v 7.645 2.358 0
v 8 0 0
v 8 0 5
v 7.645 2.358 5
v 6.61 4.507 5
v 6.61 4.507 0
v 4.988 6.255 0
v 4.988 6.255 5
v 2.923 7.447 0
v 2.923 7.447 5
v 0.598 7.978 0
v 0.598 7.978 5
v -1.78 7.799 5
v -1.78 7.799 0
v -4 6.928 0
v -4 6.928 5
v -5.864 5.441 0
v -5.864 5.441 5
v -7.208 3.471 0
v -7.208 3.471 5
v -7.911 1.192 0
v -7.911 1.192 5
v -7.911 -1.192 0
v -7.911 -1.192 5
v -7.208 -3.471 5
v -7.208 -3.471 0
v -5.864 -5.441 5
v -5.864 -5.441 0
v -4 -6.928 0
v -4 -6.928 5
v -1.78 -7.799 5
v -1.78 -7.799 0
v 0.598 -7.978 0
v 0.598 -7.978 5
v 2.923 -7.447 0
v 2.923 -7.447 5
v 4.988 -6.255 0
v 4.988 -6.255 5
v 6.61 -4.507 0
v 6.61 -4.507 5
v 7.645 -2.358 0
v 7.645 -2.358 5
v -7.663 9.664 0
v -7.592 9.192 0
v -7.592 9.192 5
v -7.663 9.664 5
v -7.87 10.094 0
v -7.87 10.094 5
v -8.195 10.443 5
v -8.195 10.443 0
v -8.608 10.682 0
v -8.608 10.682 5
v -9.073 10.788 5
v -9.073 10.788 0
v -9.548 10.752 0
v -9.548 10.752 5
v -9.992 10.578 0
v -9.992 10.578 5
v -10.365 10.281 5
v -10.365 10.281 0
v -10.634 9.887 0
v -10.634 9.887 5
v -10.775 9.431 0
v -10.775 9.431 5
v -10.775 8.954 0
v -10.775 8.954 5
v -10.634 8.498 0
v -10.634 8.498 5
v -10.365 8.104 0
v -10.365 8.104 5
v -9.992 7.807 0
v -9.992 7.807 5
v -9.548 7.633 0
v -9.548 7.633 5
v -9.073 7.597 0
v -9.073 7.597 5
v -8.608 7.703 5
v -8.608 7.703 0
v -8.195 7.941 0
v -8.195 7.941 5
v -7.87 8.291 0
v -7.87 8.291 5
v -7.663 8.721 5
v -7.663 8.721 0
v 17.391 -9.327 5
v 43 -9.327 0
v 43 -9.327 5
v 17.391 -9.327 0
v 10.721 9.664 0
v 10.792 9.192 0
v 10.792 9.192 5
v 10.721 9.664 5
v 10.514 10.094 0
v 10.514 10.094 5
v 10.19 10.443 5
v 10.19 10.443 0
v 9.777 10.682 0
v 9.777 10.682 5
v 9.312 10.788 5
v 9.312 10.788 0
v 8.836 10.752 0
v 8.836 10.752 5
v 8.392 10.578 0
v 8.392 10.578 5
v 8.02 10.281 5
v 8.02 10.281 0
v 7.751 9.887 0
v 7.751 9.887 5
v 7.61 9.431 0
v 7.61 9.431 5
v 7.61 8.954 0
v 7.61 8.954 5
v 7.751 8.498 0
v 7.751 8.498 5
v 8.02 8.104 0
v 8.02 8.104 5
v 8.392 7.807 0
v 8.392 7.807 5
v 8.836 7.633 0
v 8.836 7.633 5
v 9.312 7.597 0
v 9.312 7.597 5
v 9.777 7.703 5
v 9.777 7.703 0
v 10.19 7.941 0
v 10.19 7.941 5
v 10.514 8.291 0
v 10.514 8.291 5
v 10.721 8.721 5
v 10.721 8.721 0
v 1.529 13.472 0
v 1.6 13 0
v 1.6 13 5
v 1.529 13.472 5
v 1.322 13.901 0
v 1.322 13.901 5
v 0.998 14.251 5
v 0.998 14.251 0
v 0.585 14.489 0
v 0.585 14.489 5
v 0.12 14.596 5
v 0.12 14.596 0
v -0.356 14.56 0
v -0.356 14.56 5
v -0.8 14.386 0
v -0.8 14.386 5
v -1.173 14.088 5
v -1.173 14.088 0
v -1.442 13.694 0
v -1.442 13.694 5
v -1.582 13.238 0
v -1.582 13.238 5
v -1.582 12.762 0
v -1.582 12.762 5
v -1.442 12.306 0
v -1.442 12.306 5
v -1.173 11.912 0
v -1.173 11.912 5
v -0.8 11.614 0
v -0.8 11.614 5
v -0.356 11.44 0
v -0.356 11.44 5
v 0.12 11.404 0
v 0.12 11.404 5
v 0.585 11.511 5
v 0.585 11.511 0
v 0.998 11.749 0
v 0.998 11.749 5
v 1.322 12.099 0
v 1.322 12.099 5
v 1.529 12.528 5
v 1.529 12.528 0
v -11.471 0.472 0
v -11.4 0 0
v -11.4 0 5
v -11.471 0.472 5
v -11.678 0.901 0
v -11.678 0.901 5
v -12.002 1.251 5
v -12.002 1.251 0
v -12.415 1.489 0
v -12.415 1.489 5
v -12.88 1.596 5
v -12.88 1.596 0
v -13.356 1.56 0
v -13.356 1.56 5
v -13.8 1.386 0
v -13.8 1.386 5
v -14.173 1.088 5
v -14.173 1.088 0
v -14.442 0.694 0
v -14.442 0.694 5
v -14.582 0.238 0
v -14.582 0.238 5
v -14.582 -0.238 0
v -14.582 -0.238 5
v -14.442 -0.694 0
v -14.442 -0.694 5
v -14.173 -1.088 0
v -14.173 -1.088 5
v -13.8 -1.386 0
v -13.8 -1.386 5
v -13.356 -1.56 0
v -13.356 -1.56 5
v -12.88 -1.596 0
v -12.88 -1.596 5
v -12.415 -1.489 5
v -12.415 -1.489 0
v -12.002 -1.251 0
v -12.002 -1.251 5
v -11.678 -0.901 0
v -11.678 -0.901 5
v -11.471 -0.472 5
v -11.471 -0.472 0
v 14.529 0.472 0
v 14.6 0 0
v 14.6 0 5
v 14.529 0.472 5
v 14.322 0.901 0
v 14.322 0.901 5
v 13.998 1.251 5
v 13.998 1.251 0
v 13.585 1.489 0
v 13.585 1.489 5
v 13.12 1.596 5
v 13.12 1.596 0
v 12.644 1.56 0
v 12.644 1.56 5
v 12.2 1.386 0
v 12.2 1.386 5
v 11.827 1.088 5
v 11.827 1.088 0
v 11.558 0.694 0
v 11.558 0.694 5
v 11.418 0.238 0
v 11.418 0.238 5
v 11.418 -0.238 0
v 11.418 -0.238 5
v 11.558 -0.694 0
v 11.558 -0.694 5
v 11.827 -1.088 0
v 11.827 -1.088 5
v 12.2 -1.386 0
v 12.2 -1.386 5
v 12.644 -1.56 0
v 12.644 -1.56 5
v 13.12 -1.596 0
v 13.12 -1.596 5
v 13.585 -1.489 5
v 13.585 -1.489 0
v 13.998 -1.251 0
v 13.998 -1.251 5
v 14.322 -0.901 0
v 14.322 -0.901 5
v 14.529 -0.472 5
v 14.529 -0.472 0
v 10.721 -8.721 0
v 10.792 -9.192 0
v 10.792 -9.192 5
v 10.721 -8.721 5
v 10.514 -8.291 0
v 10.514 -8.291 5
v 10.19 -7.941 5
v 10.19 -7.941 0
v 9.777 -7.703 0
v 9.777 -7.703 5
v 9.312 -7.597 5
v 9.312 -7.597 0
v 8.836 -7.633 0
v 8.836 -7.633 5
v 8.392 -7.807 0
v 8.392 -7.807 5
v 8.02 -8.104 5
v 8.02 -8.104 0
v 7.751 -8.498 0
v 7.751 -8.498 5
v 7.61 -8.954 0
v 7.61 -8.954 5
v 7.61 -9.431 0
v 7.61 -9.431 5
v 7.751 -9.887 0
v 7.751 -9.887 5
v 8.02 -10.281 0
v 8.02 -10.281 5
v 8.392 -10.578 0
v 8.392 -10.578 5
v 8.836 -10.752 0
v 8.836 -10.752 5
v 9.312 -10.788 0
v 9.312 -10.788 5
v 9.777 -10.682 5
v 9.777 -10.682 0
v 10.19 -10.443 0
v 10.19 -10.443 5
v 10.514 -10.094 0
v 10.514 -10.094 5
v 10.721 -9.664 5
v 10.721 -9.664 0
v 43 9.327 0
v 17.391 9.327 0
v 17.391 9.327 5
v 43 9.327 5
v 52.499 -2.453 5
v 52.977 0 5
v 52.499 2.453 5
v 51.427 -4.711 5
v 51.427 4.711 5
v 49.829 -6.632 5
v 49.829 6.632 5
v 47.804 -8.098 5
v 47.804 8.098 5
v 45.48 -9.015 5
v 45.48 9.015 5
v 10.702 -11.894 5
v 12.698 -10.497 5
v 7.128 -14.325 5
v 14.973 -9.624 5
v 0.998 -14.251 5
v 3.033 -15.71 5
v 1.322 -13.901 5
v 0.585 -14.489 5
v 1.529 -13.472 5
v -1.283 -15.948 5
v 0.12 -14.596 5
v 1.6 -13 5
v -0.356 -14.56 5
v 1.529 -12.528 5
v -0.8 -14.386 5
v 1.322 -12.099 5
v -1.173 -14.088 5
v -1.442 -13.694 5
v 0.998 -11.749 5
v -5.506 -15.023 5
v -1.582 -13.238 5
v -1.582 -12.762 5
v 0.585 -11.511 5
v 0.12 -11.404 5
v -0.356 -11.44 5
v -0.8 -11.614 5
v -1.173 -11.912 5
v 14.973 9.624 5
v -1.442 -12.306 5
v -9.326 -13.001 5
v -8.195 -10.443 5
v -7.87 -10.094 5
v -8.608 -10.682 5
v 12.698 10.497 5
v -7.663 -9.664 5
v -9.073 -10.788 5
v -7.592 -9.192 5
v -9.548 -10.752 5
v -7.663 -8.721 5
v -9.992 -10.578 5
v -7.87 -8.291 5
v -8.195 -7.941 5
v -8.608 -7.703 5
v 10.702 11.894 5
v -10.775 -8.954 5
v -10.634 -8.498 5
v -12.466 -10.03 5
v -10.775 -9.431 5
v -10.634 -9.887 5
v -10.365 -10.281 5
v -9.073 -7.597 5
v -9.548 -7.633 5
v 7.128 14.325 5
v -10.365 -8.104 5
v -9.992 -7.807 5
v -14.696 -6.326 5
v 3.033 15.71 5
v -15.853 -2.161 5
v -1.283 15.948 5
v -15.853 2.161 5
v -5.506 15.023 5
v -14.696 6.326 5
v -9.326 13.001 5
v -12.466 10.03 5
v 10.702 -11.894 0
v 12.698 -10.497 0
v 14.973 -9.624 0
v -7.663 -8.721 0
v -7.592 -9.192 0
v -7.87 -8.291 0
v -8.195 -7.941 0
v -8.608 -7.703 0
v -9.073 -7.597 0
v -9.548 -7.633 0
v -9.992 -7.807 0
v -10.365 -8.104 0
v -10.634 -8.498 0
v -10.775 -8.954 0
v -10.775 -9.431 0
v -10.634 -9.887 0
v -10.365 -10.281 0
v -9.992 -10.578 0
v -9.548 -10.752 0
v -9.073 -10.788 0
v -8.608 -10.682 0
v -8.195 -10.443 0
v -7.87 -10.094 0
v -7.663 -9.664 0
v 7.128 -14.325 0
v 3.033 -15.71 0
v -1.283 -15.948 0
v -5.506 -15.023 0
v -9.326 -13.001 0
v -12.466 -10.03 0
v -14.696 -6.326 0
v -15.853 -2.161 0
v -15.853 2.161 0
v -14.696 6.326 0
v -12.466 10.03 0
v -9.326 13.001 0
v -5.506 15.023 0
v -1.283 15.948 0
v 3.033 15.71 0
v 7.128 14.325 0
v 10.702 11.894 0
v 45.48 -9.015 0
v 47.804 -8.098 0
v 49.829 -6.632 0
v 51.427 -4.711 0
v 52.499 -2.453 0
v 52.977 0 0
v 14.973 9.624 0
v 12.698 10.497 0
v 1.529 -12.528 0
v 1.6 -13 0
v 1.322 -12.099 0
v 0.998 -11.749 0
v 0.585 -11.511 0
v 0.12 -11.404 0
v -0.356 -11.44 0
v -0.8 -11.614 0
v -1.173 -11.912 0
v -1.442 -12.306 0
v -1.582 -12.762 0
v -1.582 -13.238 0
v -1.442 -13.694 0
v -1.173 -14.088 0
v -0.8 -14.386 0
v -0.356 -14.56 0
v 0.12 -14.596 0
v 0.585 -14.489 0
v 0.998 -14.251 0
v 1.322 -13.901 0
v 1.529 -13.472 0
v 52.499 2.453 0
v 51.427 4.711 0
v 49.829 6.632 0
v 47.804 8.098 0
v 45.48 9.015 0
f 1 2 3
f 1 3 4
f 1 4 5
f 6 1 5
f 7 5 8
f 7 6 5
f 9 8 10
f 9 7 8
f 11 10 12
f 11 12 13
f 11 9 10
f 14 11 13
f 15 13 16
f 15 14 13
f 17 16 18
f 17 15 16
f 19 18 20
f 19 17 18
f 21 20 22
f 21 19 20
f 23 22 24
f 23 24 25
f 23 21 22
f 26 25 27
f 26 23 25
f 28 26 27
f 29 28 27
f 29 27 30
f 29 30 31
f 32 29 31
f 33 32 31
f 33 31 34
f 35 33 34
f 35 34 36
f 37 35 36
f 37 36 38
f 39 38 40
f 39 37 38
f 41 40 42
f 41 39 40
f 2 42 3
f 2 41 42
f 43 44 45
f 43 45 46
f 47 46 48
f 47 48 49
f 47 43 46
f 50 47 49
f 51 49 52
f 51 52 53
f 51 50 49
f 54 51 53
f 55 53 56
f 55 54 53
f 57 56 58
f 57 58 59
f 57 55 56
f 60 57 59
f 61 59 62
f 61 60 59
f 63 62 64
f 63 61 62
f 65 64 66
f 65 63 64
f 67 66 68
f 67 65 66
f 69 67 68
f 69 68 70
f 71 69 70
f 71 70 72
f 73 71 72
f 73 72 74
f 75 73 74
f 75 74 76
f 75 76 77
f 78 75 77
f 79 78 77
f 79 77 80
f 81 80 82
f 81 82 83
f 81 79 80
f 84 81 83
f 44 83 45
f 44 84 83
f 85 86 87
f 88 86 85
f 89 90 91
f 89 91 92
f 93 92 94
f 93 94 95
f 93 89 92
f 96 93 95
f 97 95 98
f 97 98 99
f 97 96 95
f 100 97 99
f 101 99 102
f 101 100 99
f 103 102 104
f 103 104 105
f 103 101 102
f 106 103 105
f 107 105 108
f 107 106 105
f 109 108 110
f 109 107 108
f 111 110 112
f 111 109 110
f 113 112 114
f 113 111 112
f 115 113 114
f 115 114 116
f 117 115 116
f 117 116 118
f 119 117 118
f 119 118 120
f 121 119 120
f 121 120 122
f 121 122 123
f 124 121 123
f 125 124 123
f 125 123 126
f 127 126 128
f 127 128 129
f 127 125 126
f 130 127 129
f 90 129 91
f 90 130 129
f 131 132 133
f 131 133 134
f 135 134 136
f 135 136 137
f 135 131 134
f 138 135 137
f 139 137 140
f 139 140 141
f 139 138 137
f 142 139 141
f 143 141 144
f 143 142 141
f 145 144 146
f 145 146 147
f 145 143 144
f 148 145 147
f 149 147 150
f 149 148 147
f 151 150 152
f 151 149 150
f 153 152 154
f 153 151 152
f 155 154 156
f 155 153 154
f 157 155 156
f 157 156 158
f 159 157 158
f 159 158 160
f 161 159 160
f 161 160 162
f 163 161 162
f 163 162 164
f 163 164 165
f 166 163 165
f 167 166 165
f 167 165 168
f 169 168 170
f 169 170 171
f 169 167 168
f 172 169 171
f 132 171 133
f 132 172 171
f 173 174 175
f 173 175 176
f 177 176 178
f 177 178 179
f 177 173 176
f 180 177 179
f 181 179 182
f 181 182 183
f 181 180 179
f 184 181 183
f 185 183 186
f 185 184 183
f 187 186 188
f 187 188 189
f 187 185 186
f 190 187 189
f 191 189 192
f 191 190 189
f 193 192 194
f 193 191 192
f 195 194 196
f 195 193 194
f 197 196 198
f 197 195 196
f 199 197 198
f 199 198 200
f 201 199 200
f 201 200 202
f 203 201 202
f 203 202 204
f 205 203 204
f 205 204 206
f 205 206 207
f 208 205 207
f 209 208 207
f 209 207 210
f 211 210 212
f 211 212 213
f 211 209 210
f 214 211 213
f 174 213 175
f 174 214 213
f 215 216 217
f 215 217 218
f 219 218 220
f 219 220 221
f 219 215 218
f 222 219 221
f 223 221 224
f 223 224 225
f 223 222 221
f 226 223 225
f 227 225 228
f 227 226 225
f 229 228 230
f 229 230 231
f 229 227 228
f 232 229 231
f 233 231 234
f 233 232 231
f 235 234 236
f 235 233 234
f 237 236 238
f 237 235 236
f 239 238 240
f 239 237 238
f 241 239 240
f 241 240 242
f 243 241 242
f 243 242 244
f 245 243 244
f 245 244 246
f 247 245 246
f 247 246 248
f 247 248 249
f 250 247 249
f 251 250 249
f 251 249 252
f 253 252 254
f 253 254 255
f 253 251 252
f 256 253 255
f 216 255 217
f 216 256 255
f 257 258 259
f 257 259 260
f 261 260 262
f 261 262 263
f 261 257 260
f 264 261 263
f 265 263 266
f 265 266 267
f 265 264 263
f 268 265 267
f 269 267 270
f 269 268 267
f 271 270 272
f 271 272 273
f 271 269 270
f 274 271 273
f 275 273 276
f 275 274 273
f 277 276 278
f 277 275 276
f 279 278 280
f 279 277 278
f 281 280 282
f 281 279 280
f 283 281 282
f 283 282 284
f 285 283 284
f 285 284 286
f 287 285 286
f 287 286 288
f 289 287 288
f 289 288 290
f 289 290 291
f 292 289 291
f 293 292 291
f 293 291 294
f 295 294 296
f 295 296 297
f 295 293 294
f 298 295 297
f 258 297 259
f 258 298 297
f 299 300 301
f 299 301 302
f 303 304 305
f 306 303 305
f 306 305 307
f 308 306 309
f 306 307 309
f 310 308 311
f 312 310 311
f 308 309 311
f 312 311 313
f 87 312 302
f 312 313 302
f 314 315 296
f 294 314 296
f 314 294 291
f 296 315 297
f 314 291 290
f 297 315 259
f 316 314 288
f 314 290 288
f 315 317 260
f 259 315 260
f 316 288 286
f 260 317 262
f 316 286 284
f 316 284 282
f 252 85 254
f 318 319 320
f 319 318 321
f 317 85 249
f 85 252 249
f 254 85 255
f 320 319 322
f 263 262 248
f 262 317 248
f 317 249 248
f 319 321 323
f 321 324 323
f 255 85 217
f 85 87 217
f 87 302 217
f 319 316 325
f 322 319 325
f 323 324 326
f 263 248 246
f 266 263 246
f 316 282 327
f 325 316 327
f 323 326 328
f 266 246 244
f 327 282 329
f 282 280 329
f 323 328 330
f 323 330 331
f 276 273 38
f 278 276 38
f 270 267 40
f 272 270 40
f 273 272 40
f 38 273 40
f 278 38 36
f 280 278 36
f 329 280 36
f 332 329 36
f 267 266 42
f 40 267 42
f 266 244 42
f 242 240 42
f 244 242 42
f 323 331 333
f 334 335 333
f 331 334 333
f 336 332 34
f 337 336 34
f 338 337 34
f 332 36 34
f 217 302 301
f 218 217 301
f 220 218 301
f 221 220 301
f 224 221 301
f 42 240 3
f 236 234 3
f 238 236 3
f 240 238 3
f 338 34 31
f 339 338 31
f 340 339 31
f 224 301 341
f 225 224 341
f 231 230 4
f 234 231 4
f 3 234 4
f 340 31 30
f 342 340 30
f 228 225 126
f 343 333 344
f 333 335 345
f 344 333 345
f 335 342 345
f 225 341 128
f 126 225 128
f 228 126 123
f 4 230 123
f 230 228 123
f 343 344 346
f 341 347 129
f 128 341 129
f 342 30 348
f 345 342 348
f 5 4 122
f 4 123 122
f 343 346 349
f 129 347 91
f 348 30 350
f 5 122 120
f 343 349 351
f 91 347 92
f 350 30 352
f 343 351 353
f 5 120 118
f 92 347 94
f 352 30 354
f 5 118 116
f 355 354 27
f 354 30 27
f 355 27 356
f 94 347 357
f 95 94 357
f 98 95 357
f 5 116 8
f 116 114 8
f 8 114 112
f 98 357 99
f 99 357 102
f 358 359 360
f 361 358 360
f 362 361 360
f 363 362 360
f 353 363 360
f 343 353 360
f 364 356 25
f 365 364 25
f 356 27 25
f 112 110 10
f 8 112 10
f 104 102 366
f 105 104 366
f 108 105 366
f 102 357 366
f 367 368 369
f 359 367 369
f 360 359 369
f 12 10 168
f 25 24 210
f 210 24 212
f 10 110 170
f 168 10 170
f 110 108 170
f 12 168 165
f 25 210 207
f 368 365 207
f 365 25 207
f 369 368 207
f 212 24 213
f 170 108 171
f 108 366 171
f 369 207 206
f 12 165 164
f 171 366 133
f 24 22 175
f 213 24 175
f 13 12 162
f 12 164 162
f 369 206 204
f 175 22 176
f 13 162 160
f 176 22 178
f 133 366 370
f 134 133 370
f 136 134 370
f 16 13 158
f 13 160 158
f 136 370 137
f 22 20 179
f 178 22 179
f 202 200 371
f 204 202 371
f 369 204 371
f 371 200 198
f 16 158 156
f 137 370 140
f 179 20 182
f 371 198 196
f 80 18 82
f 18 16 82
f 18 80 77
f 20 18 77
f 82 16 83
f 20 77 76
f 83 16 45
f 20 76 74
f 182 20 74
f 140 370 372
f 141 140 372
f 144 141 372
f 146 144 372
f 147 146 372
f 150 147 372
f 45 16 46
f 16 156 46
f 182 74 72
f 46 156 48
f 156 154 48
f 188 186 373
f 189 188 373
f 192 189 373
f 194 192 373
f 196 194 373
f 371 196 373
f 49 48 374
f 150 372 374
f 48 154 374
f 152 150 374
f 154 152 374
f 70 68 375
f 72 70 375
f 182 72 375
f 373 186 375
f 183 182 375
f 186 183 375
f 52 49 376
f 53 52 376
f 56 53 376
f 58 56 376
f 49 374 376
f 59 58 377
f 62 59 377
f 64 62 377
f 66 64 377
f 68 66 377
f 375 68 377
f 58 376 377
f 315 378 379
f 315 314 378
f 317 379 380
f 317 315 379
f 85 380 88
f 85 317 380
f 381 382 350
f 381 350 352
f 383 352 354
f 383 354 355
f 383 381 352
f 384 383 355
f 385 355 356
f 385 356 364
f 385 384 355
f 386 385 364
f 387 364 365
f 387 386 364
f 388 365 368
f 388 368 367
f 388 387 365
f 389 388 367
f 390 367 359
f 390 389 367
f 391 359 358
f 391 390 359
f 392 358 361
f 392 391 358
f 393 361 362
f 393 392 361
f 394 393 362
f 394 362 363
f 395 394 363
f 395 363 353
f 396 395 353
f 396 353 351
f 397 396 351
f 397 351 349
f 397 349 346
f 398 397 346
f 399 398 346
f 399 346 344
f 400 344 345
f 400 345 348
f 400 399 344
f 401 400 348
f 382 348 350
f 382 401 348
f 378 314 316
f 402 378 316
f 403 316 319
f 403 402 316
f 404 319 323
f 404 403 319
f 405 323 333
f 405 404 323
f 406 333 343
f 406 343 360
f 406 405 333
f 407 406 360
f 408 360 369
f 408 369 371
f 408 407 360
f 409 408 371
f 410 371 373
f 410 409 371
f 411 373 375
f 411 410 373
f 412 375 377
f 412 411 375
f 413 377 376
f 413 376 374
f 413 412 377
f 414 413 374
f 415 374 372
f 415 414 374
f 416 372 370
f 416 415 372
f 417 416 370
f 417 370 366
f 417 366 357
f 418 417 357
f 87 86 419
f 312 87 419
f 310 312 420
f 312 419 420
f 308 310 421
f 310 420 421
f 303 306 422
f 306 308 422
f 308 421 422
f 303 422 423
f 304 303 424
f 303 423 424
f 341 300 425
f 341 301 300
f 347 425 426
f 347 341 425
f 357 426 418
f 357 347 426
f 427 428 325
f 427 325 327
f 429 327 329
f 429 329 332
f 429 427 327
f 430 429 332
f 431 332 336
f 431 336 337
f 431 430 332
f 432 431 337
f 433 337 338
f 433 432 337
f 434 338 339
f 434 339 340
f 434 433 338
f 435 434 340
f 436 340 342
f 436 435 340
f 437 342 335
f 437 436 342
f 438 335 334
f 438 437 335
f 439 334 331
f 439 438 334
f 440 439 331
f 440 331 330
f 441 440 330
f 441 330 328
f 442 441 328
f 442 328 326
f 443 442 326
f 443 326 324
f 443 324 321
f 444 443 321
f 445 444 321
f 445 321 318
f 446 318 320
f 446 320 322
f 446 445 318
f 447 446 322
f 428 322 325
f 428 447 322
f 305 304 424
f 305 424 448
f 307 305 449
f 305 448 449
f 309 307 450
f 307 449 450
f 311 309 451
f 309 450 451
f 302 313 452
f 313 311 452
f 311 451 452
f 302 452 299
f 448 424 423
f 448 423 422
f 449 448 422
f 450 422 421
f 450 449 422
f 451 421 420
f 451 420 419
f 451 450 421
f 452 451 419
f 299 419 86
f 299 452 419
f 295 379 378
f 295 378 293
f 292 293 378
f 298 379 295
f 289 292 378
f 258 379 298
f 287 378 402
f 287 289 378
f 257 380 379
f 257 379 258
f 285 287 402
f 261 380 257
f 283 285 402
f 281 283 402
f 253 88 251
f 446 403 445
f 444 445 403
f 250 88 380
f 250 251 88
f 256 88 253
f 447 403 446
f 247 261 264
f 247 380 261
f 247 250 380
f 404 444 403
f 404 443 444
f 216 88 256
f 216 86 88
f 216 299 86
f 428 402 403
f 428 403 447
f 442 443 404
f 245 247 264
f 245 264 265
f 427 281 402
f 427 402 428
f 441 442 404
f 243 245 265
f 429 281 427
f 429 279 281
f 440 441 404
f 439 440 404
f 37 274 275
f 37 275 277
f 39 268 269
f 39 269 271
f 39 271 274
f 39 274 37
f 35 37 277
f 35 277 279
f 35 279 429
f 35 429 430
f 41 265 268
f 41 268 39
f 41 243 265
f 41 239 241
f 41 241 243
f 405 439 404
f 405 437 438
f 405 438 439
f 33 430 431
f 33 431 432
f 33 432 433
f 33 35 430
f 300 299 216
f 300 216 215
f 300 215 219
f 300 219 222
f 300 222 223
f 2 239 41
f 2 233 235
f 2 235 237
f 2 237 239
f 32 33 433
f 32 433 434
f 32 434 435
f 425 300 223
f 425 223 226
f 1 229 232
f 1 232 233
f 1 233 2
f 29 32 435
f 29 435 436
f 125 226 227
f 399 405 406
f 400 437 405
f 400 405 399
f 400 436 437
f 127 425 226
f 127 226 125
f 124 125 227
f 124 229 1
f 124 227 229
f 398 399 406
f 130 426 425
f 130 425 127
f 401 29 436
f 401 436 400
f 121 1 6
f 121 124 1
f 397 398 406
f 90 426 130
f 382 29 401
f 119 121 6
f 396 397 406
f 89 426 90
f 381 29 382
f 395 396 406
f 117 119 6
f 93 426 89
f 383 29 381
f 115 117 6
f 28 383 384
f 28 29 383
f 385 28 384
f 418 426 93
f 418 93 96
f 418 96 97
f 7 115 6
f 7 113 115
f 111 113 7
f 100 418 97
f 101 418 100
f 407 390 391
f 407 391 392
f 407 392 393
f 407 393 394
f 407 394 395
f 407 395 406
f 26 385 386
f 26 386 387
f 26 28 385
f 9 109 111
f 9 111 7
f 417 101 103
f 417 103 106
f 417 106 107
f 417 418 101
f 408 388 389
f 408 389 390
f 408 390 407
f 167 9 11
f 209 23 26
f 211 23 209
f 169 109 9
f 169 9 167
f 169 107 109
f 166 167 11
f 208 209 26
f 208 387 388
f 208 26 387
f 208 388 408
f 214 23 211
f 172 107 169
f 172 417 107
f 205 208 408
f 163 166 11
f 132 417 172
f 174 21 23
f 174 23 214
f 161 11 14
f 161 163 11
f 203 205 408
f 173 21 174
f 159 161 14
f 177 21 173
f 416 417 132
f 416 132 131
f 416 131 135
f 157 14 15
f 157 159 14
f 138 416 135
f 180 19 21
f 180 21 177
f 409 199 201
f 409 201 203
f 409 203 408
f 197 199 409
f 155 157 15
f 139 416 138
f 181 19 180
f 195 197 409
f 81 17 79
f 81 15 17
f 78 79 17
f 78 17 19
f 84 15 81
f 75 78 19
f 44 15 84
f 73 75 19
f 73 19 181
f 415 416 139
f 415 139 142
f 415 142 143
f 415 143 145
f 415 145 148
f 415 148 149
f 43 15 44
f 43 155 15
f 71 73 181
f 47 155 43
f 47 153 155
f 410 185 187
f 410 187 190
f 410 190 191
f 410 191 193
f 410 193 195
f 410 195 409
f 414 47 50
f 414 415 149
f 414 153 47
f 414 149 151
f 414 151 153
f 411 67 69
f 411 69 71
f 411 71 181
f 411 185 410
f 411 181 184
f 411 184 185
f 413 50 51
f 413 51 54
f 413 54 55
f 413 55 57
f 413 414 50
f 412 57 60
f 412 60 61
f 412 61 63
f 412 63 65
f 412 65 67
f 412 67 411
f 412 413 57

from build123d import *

# Parameters (mm, degrees)
SKETCH1_R           = 1.6
SKETCH1_R_2         = 8
BOSS_EXTRUDE1_DEPTH = 5
FILLET1_R           = 10
FILLET2_R           = 10


with BuildPart() as part:
    # Sketch1 → Boss-Extrude1 (new body)
    with BuildSketch(Plane.XY):
        with BuildLine():
            Line((13, 9.327379053), (53, 9.327379053))
            Line((53, 9.327379053), (53, -9.327379053))
            Line((53, -9.327379053), (13, -9.327379053))
            ThreePointArc((13, -9.327379053), (-16, 0), (13, 9.327379053))
        make_face()
        with Locations((0, 13)):
            Circle(SKETCH1_R, mode=Mode.SUBTRACT)
        with Locations((9.192388155, 9.192388155)):
            Circle(SKETCH1_R, mode=Mode.SUBTRACT)
        with Locations((13, 0)):
            Circle(SKETCH1_R, mode=Mode.SUBTRACT)
        with Locations((9.192388155, -9.192388155)):
            Circle(SKETCH1_R, mode=Mode.SUBTRACT)
        with Locations((0, -13)):
            Circle(SKETCH1_R, mode=Mode.SUBTRACT)
        with Locations((-9.192388155, -9.192388155)):
            Circle(SKETCH1_R, mode=Mode.SUBTRACT)
        with Locations((-13, 0)):
            Circle(SKETCH1_R, mode=Mode.SUBTRACT)
        with Locations((-9.192388155, 9.192388155)):
            Circle(SKETCH1_R, mode=Mode.SUBTRACT)
        Circle(SKETCH1_R_2, mode=Mode.SUBTRACT)
    extrude(amount=BOSS_EXTRUDE1_DEPTH)

    # Fillet1
    # the kernel refuses this fillet: 10 mm, written as the material it takes off along each edge
    with BuildSketch(Plane(origin=(53, -9.327379053, -25), x_dir=(0, 1, 0), z_dir=(0, 0, 1)), Plane(origin=(53, 9.327379053, -25), x_dir=(-1, 0, 0), z_dir=(0, 0, 1))) as fillet1_piece_1:
        with BuildLine():
            CenterArc((FILLET1_R, FILLET1_R), FILLET1_R, 180, 90)
            Line((0, FILLET1_R), (0, 0))
            Line((0, 0), (FILLET1_R, 0))
        make_face()
    extrude(amount=55, mode=Mode.SUBTRACT)

    # Fillet2
    fillet2_edges = [part.edges().sort_by_distance(p)[0] for p in [
        (13, 9.327379053, 2.5),
        (13, -9.327379053, 2.5),
    ]]
    fillet(fillet2_edges, radius=FILLET2_R)


solid = part.part
